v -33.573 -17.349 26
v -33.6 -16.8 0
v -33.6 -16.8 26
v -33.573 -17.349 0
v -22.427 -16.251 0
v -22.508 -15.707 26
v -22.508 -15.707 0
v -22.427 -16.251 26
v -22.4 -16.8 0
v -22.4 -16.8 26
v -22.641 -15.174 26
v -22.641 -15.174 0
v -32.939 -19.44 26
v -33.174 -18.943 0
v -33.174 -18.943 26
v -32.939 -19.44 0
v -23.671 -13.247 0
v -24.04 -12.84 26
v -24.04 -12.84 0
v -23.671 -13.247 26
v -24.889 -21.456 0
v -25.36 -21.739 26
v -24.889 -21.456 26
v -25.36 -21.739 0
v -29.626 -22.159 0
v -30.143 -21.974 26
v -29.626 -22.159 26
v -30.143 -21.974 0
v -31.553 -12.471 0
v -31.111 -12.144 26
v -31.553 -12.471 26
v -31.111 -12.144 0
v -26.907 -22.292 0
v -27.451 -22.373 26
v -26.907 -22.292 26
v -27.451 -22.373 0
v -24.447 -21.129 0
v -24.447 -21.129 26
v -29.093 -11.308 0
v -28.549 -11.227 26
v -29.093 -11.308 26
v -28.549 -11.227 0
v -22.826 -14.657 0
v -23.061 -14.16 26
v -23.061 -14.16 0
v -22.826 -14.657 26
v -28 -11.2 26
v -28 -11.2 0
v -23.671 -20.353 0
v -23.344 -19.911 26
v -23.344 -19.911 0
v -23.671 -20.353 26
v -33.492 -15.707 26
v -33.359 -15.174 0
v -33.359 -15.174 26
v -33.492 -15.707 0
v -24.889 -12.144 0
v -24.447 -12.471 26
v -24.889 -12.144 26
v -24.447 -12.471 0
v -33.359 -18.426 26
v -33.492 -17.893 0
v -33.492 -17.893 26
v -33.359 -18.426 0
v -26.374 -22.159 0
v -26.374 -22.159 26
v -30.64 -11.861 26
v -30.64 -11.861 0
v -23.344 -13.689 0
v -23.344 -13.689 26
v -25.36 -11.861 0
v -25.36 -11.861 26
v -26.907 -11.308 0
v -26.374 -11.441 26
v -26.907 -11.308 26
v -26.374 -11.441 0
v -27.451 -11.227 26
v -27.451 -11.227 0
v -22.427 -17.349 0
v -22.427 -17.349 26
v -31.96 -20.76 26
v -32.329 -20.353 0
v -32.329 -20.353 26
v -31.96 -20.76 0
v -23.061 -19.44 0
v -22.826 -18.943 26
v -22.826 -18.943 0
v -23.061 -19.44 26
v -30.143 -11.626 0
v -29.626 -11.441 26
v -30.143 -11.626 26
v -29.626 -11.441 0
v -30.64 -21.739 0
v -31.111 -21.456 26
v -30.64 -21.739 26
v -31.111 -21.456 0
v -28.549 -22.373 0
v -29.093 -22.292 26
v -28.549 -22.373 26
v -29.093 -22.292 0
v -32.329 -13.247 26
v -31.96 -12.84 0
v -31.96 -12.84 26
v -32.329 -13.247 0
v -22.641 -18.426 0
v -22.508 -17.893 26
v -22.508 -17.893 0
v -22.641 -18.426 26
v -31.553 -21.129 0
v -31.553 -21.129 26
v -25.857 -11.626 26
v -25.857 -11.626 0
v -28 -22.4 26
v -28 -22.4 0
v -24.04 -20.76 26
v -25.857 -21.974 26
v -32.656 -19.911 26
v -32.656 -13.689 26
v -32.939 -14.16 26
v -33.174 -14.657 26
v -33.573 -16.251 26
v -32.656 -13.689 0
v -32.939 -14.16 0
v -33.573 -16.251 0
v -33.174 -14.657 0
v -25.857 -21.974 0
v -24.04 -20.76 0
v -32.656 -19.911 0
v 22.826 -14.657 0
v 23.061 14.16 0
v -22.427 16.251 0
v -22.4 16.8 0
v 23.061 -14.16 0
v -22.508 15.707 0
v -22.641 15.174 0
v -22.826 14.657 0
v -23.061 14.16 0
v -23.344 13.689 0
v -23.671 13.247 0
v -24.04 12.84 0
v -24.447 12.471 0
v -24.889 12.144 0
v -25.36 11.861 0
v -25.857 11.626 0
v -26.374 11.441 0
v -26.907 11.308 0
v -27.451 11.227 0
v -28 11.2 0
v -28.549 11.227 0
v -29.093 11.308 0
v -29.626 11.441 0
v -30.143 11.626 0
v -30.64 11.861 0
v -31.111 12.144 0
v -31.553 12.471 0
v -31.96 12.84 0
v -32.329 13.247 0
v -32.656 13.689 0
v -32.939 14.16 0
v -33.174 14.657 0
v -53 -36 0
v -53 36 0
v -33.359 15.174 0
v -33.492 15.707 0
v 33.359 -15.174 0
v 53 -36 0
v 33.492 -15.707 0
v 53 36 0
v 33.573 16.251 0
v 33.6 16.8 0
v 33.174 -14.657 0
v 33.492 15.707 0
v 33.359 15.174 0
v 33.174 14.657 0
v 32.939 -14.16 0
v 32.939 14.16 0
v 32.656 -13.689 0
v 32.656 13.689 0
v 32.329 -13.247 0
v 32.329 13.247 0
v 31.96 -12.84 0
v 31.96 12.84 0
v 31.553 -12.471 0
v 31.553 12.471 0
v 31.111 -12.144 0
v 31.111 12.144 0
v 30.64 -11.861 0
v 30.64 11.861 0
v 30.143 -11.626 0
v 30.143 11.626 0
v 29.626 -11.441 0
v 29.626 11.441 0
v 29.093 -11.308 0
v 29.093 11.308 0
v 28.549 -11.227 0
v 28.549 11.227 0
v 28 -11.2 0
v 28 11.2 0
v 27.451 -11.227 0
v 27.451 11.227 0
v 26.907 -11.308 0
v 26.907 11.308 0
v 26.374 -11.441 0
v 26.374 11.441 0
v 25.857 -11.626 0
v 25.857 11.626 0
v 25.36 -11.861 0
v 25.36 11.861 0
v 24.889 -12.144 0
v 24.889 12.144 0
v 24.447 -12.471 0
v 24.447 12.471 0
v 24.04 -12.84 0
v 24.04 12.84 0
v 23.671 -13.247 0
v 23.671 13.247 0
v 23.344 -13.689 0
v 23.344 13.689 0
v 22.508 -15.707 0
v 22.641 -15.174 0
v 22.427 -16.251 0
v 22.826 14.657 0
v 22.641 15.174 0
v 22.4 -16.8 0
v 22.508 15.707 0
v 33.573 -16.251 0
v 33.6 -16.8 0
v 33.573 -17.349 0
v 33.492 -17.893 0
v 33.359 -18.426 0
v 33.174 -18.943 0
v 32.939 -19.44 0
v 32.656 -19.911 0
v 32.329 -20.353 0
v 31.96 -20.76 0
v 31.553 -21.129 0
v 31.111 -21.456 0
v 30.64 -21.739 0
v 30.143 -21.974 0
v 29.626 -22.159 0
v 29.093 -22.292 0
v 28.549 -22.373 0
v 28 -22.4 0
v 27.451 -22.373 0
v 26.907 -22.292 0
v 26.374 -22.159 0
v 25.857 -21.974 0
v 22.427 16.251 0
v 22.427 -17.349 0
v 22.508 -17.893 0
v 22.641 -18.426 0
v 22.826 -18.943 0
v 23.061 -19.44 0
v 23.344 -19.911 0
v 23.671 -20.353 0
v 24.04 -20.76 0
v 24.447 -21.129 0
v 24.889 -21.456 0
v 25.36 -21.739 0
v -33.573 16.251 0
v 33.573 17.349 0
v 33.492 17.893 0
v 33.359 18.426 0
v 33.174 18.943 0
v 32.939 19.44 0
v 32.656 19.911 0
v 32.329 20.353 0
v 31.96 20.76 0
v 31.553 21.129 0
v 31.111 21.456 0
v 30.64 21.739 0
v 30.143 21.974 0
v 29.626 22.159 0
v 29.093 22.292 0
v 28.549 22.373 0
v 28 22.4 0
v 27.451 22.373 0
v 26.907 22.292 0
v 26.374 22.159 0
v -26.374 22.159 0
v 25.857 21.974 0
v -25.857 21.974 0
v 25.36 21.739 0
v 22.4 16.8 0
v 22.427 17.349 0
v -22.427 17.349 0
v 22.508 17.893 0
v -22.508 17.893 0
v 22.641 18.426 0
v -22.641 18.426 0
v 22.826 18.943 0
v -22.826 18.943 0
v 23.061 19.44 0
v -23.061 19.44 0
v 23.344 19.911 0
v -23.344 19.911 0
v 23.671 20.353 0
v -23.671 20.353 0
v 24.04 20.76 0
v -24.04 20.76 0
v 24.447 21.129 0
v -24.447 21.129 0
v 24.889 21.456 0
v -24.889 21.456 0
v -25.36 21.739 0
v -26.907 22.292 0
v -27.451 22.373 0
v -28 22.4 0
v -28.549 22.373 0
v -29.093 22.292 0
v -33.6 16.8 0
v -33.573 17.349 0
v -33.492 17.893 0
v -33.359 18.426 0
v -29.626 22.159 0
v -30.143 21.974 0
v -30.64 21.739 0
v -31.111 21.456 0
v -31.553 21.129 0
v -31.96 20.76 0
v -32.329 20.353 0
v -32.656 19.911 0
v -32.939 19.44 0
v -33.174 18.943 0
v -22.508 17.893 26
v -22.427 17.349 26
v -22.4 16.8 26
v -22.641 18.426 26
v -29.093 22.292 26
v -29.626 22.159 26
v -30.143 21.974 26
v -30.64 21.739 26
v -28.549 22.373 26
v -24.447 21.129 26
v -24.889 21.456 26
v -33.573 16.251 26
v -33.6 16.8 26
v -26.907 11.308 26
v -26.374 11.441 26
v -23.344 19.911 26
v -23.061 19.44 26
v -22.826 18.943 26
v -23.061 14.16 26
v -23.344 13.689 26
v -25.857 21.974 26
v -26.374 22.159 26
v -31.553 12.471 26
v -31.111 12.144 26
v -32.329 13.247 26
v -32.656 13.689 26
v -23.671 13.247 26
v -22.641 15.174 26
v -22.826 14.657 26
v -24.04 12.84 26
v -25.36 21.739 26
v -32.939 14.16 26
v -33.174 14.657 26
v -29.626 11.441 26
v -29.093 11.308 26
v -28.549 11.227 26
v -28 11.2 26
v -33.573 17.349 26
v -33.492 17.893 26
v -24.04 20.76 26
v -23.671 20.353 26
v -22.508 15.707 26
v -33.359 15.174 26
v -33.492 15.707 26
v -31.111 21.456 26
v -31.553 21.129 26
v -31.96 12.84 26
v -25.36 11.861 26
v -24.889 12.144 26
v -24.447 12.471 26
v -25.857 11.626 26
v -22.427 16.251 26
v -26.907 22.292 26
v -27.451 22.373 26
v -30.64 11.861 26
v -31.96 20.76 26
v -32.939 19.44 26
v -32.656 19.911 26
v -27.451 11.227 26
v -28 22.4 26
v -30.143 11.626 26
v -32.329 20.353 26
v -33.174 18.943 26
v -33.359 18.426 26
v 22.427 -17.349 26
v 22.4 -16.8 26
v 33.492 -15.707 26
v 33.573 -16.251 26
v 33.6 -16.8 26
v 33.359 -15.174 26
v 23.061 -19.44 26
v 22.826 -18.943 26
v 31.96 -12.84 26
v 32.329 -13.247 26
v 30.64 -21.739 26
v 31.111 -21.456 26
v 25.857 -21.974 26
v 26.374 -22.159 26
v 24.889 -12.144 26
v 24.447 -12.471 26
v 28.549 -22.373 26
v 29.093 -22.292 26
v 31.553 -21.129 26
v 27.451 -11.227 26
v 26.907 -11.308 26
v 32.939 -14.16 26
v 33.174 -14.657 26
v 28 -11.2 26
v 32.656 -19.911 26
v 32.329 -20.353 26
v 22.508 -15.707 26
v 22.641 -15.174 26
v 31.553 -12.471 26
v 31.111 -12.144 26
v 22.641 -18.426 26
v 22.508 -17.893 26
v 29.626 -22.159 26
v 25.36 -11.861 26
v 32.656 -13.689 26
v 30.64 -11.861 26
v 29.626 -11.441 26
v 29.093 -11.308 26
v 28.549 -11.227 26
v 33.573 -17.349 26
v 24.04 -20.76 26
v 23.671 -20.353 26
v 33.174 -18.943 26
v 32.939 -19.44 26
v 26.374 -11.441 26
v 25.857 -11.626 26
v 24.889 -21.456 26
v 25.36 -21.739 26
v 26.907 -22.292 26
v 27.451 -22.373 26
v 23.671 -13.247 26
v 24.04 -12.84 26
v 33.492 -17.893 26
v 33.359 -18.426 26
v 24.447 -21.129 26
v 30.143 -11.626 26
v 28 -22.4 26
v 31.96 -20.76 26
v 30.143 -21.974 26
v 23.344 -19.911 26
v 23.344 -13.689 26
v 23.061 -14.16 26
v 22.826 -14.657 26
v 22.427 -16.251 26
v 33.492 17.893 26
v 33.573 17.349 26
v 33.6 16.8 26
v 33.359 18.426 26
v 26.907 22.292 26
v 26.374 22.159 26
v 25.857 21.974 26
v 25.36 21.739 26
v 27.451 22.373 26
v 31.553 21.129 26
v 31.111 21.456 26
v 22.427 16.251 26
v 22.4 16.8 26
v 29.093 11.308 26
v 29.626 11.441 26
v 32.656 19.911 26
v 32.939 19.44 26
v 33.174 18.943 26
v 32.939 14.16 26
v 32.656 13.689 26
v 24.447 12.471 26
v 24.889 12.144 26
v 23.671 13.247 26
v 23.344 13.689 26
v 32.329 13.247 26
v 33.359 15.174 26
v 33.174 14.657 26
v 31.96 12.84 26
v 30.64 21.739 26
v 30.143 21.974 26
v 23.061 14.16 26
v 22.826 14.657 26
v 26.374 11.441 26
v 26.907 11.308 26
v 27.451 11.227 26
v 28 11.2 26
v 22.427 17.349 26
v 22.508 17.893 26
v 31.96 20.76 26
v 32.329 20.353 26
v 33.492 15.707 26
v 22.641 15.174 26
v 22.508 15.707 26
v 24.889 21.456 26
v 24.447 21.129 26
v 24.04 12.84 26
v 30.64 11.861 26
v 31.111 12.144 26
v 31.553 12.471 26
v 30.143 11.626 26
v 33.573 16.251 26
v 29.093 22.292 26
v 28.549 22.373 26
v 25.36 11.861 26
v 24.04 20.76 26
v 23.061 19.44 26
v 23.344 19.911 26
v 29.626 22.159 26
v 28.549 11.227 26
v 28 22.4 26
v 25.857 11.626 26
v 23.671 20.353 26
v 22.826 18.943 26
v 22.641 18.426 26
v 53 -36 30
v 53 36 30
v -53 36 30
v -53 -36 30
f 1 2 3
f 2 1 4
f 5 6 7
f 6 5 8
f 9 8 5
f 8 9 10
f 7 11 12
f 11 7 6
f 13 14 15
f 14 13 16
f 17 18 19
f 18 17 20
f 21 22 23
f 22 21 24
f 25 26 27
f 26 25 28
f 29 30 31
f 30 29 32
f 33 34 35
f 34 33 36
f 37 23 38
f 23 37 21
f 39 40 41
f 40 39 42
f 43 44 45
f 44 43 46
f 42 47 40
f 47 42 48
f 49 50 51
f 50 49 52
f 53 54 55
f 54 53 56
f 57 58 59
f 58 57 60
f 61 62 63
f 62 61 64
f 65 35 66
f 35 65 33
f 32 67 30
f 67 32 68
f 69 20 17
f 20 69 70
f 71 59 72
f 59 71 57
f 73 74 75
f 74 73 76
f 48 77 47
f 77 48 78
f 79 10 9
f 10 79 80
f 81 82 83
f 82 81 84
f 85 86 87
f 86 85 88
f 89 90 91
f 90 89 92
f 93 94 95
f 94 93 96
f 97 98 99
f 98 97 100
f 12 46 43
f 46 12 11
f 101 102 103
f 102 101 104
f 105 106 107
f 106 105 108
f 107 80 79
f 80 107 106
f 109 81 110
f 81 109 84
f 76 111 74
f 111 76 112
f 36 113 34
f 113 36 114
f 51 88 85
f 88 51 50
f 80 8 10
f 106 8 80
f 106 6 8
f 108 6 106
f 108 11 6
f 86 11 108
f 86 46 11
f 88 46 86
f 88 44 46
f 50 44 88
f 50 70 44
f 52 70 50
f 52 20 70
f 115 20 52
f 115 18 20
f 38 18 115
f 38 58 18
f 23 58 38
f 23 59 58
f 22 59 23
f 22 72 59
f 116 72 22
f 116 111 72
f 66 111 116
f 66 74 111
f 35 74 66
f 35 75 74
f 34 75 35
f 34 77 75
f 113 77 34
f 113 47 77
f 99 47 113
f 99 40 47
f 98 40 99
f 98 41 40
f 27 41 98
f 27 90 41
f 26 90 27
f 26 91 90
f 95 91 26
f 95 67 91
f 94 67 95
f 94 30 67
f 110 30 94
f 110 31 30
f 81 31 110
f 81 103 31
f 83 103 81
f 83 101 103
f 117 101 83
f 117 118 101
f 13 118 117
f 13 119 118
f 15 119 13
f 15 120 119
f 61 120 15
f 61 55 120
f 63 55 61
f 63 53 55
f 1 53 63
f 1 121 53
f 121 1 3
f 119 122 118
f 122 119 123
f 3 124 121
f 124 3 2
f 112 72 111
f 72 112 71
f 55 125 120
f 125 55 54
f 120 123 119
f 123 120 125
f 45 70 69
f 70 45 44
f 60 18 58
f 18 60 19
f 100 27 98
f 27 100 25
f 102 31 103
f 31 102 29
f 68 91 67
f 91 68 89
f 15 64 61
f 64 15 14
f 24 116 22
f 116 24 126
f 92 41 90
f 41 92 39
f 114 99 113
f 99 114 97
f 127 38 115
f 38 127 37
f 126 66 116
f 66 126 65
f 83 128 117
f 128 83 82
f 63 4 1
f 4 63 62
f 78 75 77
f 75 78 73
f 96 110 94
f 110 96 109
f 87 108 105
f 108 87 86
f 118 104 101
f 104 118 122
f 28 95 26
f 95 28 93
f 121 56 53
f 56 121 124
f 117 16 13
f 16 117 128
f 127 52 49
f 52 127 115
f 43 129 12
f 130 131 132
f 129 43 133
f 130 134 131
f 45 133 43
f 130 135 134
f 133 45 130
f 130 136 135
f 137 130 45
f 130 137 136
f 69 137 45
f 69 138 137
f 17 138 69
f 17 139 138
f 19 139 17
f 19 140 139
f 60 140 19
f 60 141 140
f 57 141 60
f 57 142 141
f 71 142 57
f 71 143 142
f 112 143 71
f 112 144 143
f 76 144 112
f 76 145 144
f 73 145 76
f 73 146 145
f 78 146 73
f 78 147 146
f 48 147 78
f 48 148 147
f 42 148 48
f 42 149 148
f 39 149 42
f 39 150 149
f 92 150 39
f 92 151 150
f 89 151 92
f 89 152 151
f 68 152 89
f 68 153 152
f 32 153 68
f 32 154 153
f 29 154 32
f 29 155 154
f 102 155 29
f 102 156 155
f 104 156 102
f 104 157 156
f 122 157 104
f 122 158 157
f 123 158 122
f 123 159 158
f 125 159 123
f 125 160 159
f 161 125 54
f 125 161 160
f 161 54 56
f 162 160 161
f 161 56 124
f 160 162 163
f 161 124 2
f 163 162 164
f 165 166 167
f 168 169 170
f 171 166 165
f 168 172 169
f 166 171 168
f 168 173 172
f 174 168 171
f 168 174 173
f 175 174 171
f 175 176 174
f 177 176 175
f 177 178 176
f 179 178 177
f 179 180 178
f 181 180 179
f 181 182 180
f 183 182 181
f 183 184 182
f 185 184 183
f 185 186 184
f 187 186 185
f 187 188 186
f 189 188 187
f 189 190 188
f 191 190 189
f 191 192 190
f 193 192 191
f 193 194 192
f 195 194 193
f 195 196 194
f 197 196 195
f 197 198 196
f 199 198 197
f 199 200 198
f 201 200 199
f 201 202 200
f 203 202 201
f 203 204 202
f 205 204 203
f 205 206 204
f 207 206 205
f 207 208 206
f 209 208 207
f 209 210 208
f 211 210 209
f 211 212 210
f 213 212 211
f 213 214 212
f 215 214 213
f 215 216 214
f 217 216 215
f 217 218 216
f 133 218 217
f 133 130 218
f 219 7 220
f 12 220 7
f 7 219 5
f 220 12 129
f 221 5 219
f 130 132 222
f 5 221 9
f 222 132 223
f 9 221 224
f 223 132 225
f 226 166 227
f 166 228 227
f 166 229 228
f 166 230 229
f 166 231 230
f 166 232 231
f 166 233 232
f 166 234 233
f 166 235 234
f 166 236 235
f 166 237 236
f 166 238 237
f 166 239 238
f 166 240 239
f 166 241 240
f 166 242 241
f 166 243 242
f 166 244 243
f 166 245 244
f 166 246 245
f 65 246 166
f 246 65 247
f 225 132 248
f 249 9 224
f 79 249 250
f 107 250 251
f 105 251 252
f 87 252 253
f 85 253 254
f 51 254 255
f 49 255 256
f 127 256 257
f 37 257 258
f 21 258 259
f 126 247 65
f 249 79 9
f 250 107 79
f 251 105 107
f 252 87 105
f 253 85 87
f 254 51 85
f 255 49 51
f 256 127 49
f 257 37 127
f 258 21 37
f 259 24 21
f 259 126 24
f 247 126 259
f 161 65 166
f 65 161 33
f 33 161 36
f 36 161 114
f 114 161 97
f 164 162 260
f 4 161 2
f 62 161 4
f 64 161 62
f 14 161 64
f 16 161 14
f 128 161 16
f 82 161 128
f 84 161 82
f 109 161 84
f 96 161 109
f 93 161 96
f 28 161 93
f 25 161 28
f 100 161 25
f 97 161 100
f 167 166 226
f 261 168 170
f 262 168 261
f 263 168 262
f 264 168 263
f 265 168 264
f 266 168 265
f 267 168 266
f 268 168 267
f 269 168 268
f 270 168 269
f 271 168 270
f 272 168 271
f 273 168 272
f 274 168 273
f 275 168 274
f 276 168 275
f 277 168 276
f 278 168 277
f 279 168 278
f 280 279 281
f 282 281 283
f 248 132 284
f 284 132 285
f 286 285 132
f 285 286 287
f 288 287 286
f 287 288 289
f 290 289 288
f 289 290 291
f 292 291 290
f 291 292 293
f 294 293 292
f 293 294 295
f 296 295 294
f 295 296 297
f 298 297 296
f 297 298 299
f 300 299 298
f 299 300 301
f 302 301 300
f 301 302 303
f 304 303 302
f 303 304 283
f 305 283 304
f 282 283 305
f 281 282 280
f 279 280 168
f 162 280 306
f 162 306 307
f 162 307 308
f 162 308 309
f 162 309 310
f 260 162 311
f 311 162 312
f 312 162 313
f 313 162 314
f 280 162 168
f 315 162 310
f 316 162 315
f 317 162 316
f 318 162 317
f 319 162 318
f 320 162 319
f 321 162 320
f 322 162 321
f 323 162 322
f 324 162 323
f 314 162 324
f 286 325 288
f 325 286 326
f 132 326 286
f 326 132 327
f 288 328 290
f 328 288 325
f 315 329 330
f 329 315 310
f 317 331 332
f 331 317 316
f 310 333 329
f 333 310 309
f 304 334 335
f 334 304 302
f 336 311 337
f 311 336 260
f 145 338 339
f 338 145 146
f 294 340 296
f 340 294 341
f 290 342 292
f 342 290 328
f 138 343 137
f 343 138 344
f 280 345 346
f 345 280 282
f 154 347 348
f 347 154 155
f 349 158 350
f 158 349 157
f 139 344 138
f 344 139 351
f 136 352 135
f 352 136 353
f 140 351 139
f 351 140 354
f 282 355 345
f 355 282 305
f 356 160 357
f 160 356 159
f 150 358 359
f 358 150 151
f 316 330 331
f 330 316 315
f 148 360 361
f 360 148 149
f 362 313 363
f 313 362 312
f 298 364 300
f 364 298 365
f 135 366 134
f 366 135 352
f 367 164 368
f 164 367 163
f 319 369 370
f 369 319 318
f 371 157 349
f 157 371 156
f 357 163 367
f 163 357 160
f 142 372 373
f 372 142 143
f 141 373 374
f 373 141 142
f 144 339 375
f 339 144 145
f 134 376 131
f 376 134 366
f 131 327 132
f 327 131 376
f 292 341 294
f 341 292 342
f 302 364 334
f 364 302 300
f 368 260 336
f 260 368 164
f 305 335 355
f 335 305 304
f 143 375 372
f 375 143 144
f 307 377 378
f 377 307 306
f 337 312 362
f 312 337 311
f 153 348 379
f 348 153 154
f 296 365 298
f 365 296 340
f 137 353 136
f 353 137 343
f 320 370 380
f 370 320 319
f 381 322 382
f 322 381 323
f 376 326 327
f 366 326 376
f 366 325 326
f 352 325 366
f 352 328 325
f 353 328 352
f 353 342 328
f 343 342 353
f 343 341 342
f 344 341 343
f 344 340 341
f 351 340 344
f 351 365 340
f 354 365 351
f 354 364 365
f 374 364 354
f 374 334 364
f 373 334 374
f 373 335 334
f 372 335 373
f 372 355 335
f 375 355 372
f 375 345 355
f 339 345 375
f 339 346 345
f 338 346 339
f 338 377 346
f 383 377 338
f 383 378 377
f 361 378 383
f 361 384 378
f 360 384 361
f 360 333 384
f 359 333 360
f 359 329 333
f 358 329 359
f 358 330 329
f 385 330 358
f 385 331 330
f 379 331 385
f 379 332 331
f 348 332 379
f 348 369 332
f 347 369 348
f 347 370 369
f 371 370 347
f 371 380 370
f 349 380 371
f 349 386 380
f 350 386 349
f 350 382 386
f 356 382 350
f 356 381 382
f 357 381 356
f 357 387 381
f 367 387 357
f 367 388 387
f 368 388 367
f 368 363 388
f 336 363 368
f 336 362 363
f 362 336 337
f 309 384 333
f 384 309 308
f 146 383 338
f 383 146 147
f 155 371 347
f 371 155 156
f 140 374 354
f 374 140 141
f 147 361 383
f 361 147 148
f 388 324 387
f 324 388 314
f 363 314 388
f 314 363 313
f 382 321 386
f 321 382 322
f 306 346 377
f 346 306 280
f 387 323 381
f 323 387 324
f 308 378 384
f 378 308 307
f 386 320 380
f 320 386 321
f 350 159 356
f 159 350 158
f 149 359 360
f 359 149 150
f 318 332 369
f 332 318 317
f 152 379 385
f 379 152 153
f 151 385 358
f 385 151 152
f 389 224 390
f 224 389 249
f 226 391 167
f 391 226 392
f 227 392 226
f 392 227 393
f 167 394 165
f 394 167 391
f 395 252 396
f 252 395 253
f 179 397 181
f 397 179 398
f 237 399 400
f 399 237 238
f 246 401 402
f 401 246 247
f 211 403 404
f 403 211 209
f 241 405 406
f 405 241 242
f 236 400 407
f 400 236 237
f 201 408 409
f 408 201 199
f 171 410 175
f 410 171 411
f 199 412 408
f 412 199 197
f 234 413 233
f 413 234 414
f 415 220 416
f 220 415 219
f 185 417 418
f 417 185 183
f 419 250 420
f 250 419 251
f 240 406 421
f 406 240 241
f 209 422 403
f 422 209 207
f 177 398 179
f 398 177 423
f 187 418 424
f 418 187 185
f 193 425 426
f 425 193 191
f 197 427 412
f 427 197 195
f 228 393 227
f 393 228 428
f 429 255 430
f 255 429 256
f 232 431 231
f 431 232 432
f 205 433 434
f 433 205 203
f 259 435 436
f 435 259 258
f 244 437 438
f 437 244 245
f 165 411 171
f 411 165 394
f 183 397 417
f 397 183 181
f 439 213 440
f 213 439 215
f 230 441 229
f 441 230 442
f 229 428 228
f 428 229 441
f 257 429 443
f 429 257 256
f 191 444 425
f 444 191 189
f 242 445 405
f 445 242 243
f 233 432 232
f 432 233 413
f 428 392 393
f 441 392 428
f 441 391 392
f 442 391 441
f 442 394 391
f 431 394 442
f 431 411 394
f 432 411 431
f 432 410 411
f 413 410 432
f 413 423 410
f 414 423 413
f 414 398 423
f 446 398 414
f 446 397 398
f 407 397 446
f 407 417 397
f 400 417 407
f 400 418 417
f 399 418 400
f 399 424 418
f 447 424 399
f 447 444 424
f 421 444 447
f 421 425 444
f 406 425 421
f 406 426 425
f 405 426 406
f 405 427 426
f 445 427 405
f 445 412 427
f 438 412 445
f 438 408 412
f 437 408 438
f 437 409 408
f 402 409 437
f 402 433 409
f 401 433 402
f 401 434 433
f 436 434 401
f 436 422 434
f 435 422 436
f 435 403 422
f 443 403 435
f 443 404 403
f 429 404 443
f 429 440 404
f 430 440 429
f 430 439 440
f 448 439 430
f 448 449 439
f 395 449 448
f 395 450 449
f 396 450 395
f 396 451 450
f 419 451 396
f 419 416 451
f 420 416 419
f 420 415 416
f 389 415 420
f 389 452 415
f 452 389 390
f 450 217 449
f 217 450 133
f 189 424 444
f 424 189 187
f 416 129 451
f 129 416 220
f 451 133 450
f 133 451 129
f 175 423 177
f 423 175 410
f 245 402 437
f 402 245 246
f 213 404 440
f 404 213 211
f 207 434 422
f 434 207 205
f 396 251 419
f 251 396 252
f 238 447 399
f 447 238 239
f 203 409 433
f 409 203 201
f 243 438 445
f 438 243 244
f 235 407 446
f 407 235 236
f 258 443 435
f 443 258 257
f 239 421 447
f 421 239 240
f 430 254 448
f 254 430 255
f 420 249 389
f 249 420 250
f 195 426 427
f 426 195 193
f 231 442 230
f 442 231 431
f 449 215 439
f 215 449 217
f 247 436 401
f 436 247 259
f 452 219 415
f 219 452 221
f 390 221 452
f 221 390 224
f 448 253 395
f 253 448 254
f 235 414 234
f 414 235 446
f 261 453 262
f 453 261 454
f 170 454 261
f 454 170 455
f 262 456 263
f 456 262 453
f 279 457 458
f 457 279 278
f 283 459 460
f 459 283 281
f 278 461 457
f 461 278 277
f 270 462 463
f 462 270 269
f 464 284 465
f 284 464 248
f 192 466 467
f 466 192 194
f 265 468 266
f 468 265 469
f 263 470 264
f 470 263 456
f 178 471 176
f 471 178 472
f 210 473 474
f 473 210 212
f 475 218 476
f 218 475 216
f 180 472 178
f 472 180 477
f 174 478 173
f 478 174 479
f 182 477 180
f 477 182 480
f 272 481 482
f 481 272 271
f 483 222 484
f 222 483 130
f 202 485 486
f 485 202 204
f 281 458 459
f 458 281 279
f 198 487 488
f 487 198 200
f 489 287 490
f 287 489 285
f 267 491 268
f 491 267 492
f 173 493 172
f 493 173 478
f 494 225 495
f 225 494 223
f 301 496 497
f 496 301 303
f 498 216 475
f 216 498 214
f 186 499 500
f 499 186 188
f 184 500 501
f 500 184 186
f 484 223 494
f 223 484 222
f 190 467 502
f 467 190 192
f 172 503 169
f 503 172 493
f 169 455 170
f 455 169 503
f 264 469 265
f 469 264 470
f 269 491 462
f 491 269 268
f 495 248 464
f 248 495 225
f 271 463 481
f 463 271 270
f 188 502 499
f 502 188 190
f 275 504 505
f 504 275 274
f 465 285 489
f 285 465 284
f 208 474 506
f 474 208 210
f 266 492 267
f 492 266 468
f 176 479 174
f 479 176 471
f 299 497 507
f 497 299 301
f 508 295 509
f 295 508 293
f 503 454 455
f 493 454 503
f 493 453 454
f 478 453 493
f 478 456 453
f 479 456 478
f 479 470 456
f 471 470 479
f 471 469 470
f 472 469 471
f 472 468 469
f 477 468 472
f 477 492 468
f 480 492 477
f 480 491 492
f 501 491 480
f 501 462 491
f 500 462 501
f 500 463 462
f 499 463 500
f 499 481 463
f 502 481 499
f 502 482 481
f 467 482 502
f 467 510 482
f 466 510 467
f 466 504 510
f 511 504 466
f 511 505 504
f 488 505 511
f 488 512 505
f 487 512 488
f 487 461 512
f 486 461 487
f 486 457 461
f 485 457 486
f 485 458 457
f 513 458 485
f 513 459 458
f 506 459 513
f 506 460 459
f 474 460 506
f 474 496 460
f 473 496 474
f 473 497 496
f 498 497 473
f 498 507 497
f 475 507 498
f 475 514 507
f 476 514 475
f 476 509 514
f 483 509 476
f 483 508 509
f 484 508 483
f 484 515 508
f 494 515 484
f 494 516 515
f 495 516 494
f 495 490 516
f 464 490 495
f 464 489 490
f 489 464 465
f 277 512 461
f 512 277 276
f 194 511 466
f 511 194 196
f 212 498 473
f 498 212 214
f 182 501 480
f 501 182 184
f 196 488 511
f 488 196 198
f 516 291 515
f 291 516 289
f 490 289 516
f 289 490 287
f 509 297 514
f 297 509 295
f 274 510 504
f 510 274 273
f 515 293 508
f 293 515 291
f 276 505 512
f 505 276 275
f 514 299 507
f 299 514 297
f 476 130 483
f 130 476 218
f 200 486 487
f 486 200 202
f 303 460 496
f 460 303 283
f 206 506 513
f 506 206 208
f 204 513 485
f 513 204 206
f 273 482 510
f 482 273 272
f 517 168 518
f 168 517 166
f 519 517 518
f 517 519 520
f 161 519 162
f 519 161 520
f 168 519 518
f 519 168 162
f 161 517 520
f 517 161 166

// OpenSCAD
// Bench rack for 1.5 mL microcentrifuge tubes - a solid rectangular block with a regular square
// grid of vertical through holes. NOVEL general part (a generic pegboard/rack block).
//

cols   = 6;
rows   = 4;
d      = 11.2;
reach  = 25;
L      = 106;
W      = 72;
H      = 30;
floor  = 5;

$fn = 64;

pitch_x = cols > 0 ? d * (cols - 1) : 0;
pitch_y = rows > 0 ? d * (rows - 1) : 0;

size_x = cols > 0 ? pitch_x + d : L;
size_y = rows > 0 ? pitch_y + d : W;
size_z = H;

difference() {
    translate([-L / 2, -W / 2, 0]) cube([L, W, H]);
    for (i = [0 : cols - 1], j = [0 : rows - 1])
        translate([-(size_x / 2 - d / 2) + i * pitch_x, -(size_y / 2 - d / 2) + j * pitch_y, 0])
            cylinder(h = H - floor + 1, d = d);
}
